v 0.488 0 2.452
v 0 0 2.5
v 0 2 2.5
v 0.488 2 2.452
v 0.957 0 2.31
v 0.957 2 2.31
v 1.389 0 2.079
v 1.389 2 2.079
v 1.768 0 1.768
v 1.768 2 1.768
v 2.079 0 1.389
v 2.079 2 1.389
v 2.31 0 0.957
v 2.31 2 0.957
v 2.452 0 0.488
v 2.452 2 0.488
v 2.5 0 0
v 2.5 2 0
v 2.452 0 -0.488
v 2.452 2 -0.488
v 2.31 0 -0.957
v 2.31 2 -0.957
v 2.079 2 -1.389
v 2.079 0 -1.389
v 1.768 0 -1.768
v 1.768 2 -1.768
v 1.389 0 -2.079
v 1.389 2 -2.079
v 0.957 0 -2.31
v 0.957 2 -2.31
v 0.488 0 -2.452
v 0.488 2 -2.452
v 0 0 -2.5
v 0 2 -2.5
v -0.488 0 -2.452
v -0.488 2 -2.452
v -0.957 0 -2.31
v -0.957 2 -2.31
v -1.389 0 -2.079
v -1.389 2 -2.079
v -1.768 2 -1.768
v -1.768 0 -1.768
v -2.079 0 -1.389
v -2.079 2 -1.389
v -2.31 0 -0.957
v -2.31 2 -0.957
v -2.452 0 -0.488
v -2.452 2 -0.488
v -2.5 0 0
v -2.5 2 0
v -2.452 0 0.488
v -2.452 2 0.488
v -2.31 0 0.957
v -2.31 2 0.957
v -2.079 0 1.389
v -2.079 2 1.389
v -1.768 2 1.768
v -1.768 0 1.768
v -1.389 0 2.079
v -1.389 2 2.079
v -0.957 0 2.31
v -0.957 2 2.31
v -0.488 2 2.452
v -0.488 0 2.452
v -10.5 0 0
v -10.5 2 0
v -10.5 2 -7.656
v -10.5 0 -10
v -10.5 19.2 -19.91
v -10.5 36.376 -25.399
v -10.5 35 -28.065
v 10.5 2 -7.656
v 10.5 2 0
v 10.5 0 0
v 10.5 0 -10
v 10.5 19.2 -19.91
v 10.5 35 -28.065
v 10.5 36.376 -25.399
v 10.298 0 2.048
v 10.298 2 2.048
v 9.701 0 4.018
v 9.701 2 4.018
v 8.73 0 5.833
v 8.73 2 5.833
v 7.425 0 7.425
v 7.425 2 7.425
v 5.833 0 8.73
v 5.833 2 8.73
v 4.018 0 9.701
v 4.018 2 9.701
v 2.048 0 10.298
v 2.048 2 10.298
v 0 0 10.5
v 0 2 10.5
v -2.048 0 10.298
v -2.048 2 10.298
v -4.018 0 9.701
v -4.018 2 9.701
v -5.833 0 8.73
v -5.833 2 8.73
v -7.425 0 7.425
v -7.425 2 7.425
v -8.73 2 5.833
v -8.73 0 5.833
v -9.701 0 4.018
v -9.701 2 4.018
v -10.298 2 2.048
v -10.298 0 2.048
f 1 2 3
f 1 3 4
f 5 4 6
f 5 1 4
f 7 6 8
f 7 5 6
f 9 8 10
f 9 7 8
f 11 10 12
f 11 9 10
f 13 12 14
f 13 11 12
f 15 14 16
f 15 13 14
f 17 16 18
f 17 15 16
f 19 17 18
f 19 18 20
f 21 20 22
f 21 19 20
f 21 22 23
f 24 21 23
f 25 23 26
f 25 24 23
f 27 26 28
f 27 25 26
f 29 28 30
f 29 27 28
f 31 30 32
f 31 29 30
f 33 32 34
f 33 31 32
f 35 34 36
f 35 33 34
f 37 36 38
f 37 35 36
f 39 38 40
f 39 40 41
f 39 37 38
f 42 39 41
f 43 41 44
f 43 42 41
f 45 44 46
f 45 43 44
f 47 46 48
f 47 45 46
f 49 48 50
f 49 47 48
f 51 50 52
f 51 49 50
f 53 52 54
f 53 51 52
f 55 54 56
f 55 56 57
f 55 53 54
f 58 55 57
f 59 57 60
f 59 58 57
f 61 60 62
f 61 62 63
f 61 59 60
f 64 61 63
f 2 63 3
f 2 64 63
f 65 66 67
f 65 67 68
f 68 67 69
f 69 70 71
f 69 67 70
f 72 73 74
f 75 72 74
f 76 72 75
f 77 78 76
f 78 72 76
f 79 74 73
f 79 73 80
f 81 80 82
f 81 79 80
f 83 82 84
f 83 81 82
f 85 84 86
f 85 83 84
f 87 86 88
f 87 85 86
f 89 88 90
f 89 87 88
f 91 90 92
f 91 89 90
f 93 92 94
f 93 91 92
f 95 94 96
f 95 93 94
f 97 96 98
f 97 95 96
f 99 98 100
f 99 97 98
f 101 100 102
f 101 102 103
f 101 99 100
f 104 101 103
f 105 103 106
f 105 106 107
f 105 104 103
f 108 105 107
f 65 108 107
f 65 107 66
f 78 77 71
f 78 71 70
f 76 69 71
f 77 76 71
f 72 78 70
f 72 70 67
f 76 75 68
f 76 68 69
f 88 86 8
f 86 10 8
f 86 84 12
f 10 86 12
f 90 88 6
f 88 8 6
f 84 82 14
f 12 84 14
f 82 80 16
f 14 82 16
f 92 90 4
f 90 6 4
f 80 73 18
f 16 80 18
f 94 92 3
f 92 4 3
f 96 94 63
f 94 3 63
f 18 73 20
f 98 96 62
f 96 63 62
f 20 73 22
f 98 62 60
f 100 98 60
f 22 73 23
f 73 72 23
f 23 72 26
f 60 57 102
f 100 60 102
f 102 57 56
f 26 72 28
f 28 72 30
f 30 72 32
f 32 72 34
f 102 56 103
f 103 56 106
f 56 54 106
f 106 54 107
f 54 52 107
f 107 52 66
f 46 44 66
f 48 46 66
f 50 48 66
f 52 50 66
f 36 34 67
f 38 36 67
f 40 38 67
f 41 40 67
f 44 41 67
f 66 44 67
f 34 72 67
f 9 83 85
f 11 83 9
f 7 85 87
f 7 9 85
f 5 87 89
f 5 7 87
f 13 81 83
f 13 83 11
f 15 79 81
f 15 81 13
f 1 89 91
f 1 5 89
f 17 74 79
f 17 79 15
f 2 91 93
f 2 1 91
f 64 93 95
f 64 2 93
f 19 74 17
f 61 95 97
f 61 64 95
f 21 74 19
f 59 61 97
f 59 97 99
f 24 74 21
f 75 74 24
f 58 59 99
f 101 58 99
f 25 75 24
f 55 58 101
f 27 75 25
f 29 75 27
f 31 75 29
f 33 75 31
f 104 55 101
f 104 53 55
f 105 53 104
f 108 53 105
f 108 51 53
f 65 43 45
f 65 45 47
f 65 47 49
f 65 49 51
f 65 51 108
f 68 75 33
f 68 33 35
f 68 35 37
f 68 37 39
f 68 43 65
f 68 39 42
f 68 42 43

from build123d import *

# Parameters (mm, degrees)
SKETCH1_R           = 2.5
BOSS_EXTRUDE1_DEPTH = 2
BOSS_EXTRUDE3_DEPTH = 21


with BuildPart() as part:
    # Sketch1 → Boss-Extrude1 (new body)
    with BuildSketch(Plane(origin=(0, 0, 0), x_dir=(1, 0, 0), z_dir=(0, 1, 0))):
        with BuildLine():
            Line((-10.5, 0), (-10.5, 10))
            Line((-10.5, 10), (10.5, 10))
            Line((10.5, 10), (10.5, 0))
            ThreePointArc((10.5, 0), (0, -10.5), (-10.5, 0))
        make_face()
        with Locations(Location((0, 0, 0), (0, 0, 270))):
            Circle(SKETCH1_R, mode=Mode.SUBTRACT)
    extrude(amount=BOSS_EXTRUDE1_DEPTH)

    # Sketch3 → Boss-Extrude3 (add)
    with BuildSketch(Plane(origin=(10.5, 0, 0), x_dir=(0, 0, -1), z_dir=(1, 0, 0))):
        Polygon((10, 0), (19.91, 19.2), (28.065104167, 35), (25.39926045, 36.375964127), (6.623958132, 0), align=None)
    extrude(amount=-BOSS_EXTRUDE3_DEPTH)


solid = part.part
